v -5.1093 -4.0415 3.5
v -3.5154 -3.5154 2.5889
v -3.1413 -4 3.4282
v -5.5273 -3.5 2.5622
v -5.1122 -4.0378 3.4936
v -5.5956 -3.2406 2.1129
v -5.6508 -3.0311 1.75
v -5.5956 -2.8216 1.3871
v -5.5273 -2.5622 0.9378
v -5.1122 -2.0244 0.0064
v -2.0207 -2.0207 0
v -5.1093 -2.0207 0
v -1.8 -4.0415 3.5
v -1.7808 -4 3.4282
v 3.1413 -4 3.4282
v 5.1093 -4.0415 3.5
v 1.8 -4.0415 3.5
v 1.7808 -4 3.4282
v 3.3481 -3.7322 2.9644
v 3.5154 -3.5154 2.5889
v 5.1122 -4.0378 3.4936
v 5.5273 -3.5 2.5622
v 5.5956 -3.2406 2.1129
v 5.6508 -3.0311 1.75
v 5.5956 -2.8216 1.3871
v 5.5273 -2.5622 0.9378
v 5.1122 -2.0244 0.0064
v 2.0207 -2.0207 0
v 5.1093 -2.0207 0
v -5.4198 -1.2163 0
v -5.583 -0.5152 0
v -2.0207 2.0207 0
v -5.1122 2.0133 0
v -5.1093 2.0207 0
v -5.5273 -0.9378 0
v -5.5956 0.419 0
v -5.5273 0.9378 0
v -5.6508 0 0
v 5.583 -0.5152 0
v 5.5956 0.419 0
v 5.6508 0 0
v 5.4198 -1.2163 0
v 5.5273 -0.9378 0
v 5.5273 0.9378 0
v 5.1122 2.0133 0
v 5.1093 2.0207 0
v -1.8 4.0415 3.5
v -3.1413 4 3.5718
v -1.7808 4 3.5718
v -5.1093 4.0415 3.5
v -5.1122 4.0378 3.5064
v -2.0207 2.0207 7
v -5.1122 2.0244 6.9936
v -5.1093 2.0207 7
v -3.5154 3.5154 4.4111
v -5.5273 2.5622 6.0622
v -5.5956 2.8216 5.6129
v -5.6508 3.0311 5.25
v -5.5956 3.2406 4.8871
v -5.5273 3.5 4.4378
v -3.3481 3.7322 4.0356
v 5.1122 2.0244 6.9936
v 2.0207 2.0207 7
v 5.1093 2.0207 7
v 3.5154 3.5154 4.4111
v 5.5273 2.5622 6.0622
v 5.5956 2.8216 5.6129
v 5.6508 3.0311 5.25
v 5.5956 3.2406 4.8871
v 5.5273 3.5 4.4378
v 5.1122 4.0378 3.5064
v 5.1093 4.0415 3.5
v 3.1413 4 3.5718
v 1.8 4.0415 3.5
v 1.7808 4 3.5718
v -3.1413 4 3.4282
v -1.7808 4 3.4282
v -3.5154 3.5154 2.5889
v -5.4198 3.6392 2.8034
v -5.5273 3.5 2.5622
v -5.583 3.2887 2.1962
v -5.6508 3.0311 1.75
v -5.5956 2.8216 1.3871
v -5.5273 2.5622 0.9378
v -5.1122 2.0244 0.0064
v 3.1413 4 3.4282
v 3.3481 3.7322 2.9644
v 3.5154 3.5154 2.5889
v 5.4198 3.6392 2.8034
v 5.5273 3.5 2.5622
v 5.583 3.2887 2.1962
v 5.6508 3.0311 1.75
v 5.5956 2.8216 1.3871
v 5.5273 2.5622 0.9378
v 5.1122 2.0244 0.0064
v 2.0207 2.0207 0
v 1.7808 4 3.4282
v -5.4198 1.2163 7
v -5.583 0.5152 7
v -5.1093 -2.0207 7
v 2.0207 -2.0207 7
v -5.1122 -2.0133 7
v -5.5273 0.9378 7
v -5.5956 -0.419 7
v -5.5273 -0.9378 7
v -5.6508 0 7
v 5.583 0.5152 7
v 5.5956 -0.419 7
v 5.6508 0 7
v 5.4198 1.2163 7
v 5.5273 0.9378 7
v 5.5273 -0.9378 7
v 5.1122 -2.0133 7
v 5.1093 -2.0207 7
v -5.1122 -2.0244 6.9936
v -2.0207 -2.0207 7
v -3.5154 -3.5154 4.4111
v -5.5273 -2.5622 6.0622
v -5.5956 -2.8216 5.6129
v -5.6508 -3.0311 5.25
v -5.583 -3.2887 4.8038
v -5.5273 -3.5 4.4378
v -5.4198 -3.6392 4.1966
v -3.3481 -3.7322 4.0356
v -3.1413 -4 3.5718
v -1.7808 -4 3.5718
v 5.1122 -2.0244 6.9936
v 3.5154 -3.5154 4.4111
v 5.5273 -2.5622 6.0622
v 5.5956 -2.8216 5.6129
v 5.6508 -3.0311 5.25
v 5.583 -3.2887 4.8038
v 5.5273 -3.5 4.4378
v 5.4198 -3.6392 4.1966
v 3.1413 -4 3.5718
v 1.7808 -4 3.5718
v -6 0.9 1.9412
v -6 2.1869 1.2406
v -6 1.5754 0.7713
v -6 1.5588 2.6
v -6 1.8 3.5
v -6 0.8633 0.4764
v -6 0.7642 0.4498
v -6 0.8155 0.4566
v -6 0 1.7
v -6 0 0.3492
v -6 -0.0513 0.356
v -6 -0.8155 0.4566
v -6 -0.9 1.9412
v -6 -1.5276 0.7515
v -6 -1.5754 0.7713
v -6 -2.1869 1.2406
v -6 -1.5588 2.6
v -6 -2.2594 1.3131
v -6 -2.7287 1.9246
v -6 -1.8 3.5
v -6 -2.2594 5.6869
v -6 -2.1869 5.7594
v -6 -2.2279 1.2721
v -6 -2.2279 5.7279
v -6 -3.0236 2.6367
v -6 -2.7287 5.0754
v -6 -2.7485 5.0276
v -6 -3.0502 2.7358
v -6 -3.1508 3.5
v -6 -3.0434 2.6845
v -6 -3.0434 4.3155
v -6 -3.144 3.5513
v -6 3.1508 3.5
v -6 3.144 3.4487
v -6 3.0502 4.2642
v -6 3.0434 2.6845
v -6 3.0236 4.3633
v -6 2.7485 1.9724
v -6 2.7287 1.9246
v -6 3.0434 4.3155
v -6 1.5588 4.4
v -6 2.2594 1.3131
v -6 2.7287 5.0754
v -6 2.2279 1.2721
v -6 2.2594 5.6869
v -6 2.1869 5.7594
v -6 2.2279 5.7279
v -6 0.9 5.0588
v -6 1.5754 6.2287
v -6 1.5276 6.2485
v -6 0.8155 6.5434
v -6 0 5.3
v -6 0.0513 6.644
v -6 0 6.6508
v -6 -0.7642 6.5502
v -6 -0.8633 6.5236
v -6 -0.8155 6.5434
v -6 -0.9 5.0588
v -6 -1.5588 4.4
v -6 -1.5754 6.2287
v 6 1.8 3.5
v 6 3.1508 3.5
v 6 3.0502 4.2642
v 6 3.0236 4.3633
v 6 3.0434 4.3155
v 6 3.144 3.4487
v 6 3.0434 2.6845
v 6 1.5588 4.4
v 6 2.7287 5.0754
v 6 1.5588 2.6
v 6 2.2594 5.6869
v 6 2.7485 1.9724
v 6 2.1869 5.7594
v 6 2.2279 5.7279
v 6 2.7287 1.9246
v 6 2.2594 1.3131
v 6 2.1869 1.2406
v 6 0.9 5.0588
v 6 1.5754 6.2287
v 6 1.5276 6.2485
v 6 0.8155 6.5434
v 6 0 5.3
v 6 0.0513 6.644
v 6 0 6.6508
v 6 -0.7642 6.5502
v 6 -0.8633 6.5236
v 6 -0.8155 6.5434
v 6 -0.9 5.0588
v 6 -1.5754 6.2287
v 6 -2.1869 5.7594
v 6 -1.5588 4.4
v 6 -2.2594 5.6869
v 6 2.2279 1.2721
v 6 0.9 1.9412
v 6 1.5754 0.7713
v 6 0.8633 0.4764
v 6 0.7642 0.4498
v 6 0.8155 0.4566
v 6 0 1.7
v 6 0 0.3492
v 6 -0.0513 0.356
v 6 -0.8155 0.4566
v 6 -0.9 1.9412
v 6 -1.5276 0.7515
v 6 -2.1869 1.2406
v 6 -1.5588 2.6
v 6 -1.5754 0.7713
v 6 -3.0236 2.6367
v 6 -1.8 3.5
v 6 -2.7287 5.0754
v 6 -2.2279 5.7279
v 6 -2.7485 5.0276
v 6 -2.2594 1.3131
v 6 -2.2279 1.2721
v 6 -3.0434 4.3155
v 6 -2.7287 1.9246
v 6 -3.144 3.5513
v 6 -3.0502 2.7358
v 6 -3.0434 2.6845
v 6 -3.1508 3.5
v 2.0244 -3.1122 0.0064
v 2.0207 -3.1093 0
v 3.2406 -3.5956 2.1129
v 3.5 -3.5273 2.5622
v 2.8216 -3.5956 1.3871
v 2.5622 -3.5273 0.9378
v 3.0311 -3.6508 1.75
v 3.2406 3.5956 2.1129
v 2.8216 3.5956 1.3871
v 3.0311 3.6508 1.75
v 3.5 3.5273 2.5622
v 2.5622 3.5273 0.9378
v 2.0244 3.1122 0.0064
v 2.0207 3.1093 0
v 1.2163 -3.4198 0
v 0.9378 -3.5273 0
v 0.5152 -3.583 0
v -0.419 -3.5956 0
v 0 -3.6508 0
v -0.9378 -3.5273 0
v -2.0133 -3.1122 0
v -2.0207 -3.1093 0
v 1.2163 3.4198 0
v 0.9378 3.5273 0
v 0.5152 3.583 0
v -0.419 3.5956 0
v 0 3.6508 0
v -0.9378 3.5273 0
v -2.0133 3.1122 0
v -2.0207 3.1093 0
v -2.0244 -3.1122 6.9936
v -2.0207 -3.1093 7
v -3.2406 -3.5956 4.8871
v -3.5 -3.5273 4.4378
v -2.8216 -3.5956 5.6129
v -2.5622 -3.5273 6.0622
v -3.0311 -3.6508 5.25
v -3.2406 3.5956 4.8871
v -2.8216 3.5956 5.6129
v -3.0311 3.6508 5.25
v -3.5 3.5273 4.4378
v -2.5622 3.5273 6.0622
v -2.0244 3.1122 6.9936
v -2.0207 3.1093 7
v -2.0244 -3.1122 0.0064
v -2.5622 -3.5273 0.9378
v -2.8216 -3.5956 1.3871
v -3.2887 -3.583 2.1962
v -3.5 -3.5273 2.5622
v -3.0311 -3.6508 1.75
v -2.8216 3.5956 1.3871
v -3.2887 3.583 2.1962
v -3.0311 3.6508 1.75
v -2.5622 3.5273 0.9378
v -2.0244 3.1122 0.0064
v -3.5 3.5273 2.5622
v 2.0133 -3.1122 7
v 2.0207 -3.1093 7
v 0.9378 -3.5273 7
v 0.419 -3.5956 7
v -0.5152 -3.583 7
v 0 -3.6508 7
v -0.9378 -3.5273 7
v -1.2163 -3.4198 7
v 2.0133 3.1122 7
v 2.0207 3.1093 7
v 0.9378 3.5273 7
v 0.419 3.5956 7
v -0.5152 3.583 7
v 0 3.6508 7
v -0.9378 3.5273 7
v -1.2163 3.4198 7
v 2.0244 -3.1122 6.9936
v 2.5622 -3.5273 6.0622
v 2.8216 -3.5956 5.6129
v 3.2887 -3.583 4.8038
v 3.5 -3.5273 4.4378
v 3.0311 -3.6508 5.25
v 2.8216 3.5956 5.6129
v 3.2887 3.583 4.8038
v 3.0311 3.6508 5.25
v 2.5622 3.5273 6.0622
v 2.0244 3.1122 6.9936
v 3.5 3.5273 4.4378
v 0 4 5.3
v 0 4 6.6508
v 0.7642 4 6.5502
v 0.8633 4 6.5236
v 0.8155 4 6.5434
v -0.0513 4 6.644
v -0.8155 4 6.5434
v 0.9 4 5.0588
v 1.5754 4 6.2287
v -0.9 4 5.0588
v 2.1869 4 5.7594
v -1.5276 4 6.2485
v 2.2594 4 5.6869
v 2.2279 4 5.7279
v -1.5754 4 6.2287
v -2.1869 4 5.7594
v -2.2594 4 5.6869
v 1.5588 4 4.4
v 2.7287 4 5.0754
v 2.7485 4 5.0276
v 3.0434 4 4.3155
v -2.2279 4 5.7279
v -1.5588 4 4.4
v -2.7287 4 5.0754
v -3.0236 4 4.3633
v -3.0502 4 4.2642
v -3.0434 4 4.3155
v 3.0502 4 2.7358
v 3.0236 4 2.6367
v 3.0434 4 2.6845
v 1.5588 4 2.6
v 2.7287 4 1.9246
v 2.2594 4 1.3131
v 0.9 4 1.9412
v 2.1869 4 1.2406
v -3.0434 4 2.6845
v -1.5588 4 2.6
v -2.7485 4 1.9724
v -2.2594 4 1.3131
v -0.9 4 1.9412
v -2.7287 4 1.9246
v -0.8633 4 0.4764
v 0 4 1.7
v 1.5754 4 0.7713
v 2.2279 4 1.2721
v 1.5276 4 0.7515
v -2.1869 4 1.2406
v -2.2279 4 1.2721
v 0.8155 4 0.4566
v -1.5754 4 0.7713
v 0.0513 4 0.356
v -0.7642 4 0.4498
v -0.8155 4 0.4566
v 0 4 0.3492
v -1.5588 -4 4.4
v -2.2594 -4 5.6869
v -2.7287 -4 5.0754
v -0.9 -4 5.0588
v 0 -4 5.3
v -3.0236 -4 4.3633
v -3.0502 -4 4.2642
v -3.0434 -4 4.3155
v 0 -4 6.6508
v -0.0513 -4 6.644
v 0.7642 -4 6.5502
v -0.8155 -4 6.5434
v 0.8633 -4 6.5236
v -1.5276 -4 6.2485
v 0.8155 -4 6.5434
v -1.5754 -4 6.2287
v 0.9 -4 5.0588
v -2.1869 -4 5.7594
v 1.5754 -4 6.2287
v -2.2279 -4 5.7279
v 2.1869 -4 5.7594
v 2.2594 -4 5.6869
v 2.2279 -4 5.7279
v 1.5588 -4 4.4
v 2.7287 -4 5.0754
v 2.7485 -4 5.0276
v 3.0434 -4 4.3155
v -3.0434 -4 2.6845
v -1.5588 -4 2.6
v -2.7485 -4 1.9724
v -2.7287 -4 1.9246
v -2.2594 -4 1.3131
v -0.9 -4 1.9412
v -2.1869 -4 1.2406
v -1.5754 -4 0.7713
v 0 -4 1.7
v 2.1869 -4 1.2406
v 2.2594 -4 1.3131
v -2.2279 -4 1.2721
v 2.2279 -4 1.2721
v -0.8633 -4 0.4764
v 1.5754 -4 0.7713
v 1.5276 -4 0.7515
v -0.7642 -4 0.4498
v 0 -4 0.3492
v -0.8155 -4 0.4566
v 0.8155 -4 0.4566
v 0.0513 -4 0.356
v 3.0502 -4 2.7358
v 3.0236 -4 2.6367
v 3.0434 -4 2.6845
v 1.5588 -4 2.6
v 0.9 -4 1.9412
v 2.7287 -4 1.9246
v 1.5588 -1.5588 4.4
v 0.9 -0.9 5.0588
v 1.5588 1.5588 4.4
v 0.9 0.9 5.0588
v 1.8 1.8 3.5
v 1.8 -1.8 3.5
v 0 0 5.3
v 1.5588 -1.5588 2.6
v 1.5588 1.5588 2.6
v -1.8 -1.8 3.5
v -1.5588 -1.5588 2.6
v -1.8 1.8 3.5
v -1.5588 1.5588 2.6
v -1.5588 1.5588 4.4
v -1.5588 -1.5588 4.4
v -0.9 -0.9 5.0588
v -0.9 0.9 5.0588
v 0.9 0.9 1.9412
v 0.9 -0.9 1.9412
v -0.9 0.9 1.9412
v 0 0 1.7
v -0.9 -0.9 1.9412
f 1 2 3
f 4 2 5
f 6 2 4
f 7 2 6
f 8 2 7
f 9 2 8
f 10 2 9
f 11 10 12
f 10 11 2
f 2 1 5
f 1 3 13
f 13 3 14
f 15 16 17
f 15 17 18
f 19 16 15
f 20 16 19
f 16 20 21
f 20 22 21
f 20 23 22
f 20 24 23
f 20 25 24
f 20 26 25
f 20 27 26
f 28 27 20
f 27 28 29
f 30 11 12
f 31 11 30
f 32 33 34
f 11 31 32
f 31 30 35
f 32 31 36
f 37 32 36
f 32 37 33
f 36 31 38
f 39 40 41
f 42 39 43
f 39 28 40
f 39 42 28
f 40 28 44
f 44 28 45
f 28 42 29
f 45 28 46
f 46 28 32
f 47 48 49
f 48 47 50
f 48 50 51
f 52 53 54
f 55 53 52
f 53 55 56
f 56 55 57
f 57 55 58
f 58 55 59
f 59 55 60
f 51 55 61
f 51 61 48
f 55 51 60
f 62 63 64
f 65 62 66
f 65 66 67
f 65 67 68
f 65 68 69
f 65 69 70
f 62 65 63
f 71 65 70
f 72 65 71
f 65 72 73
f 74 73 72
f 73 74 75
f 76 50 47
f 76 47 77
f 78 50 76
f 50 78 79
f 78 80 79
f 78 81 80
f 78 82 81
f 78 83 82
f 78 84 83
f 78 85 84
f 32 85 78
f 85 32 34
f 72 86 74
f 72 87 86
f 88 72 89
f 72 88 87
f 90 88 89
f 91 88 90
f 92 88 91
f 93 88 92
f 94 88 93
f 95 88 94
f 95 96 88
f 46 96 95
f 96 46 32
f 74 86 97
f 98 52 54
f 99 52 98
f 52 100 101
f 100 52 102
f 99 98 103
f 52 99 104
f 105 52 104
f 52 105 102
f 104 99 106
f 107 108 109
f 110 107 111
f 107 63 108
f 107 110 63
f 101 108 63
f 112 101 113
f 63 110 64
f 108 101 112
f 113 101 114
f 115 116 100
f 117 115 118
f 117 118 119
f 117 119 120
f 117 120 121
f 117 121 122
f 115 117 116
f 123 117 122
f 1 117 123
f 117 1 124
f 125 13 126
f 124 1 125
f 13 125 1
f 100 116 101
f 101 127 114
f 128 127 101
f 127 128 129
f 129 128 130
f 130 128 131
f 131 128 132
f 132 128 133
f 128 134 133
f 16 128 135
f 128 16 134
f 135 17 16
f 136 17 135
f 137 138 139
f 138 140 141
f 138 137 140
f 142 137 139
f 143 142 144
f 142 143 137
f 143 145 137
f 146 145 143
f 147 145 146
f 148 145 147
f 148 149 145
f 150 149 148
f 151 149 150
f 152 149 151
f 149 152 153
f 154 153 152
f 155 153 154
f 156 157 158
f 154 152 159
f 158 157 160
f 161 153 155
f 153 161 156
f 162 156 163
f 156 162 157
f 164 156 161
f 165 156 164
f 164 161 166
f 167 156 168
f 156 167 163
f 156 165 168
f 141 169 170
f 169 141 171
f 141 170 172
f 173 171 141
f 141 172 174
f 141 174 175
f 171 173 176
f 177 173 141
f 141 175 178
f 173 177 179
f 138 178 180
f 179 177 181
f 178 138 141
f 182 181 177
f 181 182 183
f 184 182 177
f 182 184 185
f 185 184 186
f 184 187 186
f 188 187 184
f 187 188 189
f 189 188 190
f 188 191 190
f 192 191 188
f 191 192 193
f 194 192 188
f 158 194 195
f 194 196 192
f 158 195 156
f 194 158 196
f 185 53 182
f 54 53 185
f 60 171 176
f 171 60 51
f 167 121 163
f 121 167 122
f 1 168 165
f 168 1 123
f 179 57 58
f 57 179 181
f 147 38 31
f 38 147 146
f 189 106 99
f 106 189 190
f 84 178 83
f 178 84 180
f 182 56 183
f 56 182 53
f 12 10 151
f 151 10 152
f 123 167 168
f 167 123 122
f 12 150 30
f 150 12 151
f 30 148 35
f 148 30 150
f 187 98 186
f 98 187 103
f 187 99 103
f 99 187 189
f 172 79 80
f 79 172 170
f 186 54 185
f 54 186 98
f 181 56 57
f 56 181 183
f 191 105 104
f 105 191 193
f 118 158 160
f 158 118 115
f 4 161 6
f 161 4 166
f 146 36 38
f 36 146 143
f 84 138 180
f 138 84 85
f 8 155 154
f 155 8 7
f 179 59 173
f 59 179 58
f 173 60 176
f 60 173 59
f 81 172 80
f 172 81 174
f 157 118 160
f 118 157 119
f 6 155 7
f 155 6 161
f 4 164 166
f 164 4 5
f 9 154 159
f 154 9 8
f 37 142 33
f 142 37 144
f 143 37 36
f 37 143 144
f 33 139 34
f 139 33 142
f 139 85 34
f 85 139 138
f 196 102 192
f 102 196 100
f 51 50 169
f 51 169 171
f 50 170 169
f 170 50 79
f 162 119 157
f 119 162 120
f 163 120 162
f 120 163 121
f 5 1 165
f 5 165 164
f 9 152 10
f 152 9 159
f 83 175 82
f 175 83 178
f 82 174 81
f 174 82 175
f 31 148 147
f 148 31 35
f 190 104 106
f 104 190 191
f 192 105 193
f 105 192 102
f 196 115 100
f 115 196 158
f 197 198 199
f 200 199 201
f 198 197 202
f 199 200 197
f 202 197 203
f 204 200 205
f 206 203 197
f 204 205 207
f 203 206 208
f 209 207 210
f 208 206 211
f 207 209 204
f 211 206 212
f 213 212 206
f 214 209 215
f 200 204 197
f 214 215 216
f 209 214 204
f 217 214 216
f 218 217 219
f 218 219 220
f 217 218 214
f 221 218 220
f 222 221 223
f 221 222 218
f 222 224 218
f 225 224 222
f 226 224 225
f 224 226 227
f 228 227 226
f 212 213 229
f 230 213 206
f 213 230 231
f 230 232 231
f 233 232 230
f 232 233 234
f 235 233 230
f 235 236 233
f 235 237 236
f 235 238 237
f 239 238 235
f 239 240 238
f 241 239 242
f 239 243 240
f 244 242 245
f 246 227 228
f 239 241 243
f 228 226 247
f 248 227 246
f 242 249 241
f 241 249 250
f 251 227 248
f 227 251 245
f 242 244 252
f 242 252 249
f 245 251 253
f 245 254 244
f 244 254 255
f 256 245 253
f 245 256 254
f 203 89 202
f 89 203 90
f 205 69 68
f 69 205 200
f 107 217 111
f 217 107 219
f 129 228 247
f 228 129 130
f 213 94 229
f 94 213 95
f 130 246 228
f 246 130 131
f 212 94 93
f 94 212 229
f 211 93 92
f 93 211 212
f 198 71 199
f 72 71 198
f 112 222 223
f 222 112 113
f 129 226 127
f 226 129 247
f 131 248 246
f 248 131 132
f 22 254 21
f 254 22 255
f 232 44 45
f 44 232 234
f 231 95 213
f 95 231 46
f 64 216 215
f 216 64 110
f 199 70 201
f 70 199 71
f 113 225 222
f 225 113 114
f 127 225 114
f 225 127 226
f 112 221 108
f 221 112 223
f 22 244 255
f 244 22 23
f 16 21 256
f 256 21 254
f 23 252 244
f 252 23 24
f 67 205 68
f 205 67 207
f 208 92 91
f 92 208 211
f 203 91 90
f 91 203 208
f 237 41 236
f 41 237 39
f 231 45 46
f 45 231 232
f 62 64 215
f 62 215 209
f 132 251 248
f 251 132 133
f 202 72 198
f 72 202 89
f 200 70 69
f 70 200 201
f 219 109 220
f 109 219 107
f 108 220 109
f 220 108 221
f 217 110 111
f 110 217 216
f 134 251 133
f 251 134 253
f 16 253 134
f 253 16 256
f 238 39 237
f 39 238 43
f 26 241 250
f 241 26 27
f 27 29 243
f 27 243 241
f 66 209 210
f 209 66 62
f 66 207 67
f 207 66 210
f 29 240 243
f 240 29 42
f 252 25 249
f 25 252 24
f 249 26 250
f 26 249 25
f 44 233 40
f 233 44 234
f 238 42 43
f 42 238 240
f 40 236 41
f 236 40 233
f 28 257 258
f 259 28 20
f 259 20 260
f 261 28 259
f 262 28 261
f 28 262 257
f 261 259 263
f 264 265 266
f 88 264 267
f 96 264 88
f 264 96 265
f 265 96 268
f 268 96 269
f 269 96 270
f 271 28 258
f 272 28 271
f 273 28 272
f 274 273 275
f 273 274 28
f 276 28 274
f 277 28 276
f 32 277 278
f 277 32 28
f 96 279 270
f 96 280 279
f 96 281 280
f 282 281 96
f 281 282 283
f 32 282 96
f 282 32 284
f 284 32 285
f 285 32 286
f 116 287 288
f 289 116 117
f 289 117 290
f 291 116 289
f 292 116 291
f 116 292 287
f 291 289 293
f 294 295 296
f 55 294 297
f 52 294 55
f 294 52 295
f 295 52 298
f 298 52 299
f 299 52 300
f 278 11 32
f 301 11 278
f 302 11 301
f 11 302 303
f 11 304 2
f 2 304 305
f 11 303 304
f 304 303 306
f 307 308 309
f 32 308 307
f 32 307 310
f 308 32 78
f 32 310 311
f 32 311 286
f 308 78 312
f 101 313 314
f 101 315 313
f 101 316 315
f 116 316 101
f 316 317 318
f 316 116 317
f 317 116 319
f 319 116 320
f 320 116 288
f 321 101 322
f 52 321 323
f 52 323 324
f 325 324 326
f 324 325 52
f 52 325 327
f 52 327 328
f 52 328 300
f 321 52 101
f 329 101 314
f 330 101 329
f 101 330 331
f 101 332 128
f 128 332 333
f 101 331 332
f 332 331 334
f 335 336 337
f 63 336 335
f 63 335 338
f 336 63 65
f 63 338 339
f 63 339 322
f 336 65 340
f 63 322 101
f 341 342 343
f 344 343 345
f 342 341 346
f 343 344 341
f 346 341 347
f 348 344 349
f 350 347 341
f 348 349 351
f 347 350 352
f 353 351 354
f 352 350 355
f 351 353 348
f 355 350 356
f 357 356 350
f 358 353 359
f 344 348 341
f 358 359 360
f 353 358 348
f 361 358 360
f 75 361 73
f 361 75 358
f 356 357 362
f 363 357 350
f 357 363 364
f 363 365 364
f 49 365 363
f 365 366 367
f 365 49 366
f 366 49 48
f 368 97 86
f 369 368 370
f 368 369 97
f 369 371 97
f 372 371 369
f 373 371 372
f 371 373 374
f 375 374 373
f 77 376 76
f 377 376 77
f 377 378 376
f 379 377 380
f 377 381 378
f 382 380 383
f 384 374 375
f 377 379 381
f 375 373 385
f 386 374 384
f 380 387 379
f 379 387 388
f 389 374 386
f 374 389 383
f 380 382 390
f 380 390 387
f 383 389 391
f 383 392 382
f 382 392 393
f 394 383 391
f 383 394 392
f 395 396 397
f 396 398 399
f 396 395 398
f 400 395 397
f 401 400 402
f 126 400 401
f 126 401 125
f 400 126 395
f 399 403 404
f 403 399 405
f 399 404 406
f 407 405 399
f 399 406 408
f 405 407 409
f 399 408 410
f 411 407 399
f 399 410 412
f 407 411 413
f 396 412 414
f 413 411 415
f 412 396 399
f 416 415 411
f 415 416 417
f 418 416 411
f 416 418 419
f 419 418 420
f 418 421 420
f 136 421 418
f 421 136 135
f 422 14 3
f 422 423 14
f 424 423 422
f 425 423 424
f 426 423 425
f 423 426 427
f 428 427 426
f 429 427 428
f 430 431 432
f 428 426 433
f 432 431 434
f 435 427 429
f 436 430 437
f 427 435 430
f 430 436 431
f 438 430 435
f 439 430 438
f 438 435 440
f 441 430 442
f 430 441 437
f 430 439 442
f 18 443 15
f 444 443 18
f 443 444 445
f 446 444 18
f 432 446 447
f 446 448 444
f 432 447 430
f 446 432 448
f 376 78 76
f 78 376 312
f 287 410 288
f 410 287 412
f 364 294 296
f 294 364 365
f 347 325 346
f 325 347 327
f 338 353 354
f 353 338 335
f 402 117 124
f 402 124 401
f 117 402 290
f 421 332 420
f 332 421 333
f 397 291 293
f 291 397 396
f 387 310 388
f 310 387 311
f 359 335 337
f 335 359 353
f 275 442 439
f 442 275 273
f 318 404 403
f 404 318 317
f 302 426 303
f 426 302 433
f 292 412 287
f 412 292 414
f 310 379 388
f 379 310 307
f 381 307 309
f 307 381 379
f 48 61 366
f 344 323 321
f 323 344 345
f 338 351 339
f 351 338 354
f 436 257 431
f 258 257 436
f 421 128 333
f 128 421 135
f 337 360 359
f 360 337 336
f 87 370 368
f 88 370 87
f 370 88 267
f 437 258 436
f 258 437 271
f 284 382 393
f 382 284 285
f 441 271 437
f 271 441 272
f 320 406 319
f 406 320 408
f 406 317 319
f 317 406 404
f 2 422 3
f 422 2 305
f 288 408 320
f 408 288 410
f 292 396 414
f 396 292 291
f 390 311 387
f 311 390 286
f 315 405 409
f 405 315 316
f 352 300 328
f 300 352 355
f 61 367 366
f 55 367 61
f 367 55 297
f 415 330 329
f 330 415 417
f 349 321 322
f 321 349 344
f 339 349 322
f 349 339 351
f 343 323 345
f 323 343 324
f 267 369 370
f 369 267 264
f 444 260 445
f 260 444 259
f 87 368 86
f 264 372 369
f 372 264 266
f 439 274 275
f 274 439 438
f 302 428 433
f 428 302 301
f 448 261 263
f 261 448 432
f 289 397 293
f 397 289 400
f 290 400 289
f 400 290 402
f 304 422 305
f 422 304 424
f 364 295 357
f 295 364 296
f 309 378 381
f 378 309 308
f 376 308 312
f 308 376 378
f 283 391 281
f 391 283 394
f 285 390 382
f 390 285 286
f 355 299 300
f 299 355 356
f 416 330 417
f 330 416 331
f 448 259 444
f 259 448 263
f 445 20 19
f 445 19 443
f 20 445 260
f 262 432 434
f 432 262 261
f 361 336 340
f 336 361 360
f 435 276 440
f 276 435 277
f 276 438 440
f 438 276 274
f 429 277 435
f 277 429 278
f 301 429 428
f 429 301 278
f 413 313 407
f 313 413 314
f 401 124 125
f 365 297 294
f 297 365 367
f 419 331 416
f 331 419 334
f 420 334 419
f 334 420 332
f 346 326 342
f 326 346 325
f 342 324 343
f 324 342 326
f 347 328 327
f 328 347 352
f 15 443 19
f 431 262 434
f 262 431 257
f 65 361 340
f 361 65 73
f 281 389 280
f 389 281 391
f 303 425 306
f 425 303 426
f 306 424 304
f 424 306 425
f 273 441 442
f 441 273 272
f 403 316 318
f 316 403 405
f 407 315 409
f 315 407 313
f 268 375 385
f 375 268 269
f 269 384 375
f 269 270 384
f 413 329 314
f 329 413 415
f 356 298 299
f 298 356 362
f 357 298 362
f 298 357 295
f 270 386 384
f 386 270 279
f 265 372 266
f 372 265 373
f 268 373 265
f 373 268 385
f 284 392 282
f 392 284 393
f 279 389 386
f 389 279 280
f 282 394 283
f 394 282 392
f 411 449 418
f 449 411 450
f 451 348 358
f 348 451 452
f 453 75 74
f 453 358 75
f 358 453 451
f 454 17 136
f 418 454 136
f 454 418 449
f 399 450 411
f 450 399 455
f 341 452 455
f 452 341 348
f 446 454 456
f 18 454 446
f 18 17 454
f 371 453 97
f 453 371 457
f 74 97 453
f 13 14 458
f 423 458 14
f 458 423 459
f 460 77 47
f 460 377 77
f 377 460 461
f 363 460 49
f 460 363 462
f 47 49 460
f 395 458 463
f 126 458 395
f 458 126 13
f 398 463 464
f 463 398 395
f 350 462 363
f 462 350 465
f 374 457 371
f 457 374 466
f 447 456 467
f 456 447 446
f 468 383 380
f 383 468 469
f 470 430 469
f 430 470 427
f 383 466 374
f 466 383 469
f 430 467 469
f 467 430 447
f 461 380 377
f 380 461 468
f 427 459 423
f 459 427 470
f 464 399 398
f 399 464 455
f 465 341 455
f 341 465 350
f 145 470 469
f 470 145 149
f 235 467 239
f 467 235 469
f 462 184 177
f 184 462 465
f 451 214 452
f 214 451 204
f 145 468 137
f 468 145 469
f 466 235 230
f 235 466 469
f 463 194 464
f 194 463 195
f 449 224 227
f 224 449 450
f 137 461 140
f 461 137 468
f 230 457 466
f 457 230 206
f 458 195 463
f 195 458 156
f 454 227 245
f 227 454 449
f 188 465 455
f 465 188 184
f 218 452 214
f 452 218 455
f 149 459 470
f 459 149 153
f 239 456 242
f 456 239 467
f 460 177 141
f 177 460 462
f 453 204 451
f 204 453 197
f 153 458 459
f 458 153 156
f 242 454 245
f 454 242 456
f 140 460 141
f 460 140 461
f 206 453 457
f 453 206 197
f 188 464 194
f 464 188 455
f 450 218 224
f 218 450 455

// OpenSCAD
// file: configuration.scad
//Configuration File
//Lets you adjust pretty much everything
//
//Makes it all super paramatric
//


//Configuration Block
$fn = 20;
module configBlock(){
	difference(){
		cube([15,30,10],center=true);

		union(){  //Vertical Holes
			translate([0,10,5]) rotate([0,0,0]) cylinder(r=M3/2,h=10,center=true);
			translate([0,3,5]) rotate([0,0,0]) cylinder(r=M4/2,h=10,center=true);
			translate([0,-8,5]) rotate([0,0,0]) cylinder(r=M8/2,h=10,center=true);
		}

		union(){  //Horizontal Holes
			translate([-8,10,0]) rotate([0,90,0]) cylinder(r=M3h/2,h=10,center=true);		
			translate([-8,3,0]) rotate([0,90,0]) cylinder(r=M4h/2,h=10,center=true);
			translate([-10,-6,0]) rotate([0,90,0]) cylinder(r=M3nut/2,h=10,center=true,$fn=6);

			translate([10,3,0]) rotate([0,90,0]) cylinder(r=M3washer/2,h=10,center=true);


			//translate([0,-8,0]) rotate([0,90,0]) cylinder(r=M8/2,h=10,center=true);
		}
	}
}

//configBlock();

//Bolts
M3 = 4;
M4 = 5;
M8 = 9;

M3h = 3.6;  //Horizontal versions
M4h = 5;  //Horizontal versions
M8h = 8; //Horizontal versions

//Nuts & Washers

M3washer = 7;
M3nut = 7;

//Size of other parts
rod = 8;  //Dimension of smooth rod
lm8uu = 16;

/*************************
 Printer Design files now
**************************/

//basic
arm_length = 100 ; //Length of the arms based on a planned 100x100 print size
pole_center = 60 ; //The pole distance from the center of the print
rod_sep = 25 + rod/2; // pole to pole seperation for one set. Includes rod length
rod_height = 260;

//motor end effector


//Universal joints
//holewidth = 6;
//arm_sep = 40;



//Hotend
// main file
include<configuration.scad>;

h = 7;
r = h/2 / cos(30);

module stumpy() {
  rotate([0, 90, 0]) rotate([0, 0, 30]) intersection() {
    cylinder(r=r, h=8, center=true, $fn=6);
    sphere(r=5.1, $fn=24);
  }
}

module middle() {
  difference() {
    union() {
      translate([-2, 0, 0]) stumpy();
      translate([2, 0, 0]) stumpy();
      rotate([0, 0, 90]) stumpy();
    }
    rotate([90, 0, 0]) cylinder(r=M3h/2, h=30, center=true, $fn=12);
    rotate([0, 90, 0]) cylinder(r=M3h/2, h=30, center=true, $fn=12);
  }
}

translate([0, 0, h/2]) middle();
